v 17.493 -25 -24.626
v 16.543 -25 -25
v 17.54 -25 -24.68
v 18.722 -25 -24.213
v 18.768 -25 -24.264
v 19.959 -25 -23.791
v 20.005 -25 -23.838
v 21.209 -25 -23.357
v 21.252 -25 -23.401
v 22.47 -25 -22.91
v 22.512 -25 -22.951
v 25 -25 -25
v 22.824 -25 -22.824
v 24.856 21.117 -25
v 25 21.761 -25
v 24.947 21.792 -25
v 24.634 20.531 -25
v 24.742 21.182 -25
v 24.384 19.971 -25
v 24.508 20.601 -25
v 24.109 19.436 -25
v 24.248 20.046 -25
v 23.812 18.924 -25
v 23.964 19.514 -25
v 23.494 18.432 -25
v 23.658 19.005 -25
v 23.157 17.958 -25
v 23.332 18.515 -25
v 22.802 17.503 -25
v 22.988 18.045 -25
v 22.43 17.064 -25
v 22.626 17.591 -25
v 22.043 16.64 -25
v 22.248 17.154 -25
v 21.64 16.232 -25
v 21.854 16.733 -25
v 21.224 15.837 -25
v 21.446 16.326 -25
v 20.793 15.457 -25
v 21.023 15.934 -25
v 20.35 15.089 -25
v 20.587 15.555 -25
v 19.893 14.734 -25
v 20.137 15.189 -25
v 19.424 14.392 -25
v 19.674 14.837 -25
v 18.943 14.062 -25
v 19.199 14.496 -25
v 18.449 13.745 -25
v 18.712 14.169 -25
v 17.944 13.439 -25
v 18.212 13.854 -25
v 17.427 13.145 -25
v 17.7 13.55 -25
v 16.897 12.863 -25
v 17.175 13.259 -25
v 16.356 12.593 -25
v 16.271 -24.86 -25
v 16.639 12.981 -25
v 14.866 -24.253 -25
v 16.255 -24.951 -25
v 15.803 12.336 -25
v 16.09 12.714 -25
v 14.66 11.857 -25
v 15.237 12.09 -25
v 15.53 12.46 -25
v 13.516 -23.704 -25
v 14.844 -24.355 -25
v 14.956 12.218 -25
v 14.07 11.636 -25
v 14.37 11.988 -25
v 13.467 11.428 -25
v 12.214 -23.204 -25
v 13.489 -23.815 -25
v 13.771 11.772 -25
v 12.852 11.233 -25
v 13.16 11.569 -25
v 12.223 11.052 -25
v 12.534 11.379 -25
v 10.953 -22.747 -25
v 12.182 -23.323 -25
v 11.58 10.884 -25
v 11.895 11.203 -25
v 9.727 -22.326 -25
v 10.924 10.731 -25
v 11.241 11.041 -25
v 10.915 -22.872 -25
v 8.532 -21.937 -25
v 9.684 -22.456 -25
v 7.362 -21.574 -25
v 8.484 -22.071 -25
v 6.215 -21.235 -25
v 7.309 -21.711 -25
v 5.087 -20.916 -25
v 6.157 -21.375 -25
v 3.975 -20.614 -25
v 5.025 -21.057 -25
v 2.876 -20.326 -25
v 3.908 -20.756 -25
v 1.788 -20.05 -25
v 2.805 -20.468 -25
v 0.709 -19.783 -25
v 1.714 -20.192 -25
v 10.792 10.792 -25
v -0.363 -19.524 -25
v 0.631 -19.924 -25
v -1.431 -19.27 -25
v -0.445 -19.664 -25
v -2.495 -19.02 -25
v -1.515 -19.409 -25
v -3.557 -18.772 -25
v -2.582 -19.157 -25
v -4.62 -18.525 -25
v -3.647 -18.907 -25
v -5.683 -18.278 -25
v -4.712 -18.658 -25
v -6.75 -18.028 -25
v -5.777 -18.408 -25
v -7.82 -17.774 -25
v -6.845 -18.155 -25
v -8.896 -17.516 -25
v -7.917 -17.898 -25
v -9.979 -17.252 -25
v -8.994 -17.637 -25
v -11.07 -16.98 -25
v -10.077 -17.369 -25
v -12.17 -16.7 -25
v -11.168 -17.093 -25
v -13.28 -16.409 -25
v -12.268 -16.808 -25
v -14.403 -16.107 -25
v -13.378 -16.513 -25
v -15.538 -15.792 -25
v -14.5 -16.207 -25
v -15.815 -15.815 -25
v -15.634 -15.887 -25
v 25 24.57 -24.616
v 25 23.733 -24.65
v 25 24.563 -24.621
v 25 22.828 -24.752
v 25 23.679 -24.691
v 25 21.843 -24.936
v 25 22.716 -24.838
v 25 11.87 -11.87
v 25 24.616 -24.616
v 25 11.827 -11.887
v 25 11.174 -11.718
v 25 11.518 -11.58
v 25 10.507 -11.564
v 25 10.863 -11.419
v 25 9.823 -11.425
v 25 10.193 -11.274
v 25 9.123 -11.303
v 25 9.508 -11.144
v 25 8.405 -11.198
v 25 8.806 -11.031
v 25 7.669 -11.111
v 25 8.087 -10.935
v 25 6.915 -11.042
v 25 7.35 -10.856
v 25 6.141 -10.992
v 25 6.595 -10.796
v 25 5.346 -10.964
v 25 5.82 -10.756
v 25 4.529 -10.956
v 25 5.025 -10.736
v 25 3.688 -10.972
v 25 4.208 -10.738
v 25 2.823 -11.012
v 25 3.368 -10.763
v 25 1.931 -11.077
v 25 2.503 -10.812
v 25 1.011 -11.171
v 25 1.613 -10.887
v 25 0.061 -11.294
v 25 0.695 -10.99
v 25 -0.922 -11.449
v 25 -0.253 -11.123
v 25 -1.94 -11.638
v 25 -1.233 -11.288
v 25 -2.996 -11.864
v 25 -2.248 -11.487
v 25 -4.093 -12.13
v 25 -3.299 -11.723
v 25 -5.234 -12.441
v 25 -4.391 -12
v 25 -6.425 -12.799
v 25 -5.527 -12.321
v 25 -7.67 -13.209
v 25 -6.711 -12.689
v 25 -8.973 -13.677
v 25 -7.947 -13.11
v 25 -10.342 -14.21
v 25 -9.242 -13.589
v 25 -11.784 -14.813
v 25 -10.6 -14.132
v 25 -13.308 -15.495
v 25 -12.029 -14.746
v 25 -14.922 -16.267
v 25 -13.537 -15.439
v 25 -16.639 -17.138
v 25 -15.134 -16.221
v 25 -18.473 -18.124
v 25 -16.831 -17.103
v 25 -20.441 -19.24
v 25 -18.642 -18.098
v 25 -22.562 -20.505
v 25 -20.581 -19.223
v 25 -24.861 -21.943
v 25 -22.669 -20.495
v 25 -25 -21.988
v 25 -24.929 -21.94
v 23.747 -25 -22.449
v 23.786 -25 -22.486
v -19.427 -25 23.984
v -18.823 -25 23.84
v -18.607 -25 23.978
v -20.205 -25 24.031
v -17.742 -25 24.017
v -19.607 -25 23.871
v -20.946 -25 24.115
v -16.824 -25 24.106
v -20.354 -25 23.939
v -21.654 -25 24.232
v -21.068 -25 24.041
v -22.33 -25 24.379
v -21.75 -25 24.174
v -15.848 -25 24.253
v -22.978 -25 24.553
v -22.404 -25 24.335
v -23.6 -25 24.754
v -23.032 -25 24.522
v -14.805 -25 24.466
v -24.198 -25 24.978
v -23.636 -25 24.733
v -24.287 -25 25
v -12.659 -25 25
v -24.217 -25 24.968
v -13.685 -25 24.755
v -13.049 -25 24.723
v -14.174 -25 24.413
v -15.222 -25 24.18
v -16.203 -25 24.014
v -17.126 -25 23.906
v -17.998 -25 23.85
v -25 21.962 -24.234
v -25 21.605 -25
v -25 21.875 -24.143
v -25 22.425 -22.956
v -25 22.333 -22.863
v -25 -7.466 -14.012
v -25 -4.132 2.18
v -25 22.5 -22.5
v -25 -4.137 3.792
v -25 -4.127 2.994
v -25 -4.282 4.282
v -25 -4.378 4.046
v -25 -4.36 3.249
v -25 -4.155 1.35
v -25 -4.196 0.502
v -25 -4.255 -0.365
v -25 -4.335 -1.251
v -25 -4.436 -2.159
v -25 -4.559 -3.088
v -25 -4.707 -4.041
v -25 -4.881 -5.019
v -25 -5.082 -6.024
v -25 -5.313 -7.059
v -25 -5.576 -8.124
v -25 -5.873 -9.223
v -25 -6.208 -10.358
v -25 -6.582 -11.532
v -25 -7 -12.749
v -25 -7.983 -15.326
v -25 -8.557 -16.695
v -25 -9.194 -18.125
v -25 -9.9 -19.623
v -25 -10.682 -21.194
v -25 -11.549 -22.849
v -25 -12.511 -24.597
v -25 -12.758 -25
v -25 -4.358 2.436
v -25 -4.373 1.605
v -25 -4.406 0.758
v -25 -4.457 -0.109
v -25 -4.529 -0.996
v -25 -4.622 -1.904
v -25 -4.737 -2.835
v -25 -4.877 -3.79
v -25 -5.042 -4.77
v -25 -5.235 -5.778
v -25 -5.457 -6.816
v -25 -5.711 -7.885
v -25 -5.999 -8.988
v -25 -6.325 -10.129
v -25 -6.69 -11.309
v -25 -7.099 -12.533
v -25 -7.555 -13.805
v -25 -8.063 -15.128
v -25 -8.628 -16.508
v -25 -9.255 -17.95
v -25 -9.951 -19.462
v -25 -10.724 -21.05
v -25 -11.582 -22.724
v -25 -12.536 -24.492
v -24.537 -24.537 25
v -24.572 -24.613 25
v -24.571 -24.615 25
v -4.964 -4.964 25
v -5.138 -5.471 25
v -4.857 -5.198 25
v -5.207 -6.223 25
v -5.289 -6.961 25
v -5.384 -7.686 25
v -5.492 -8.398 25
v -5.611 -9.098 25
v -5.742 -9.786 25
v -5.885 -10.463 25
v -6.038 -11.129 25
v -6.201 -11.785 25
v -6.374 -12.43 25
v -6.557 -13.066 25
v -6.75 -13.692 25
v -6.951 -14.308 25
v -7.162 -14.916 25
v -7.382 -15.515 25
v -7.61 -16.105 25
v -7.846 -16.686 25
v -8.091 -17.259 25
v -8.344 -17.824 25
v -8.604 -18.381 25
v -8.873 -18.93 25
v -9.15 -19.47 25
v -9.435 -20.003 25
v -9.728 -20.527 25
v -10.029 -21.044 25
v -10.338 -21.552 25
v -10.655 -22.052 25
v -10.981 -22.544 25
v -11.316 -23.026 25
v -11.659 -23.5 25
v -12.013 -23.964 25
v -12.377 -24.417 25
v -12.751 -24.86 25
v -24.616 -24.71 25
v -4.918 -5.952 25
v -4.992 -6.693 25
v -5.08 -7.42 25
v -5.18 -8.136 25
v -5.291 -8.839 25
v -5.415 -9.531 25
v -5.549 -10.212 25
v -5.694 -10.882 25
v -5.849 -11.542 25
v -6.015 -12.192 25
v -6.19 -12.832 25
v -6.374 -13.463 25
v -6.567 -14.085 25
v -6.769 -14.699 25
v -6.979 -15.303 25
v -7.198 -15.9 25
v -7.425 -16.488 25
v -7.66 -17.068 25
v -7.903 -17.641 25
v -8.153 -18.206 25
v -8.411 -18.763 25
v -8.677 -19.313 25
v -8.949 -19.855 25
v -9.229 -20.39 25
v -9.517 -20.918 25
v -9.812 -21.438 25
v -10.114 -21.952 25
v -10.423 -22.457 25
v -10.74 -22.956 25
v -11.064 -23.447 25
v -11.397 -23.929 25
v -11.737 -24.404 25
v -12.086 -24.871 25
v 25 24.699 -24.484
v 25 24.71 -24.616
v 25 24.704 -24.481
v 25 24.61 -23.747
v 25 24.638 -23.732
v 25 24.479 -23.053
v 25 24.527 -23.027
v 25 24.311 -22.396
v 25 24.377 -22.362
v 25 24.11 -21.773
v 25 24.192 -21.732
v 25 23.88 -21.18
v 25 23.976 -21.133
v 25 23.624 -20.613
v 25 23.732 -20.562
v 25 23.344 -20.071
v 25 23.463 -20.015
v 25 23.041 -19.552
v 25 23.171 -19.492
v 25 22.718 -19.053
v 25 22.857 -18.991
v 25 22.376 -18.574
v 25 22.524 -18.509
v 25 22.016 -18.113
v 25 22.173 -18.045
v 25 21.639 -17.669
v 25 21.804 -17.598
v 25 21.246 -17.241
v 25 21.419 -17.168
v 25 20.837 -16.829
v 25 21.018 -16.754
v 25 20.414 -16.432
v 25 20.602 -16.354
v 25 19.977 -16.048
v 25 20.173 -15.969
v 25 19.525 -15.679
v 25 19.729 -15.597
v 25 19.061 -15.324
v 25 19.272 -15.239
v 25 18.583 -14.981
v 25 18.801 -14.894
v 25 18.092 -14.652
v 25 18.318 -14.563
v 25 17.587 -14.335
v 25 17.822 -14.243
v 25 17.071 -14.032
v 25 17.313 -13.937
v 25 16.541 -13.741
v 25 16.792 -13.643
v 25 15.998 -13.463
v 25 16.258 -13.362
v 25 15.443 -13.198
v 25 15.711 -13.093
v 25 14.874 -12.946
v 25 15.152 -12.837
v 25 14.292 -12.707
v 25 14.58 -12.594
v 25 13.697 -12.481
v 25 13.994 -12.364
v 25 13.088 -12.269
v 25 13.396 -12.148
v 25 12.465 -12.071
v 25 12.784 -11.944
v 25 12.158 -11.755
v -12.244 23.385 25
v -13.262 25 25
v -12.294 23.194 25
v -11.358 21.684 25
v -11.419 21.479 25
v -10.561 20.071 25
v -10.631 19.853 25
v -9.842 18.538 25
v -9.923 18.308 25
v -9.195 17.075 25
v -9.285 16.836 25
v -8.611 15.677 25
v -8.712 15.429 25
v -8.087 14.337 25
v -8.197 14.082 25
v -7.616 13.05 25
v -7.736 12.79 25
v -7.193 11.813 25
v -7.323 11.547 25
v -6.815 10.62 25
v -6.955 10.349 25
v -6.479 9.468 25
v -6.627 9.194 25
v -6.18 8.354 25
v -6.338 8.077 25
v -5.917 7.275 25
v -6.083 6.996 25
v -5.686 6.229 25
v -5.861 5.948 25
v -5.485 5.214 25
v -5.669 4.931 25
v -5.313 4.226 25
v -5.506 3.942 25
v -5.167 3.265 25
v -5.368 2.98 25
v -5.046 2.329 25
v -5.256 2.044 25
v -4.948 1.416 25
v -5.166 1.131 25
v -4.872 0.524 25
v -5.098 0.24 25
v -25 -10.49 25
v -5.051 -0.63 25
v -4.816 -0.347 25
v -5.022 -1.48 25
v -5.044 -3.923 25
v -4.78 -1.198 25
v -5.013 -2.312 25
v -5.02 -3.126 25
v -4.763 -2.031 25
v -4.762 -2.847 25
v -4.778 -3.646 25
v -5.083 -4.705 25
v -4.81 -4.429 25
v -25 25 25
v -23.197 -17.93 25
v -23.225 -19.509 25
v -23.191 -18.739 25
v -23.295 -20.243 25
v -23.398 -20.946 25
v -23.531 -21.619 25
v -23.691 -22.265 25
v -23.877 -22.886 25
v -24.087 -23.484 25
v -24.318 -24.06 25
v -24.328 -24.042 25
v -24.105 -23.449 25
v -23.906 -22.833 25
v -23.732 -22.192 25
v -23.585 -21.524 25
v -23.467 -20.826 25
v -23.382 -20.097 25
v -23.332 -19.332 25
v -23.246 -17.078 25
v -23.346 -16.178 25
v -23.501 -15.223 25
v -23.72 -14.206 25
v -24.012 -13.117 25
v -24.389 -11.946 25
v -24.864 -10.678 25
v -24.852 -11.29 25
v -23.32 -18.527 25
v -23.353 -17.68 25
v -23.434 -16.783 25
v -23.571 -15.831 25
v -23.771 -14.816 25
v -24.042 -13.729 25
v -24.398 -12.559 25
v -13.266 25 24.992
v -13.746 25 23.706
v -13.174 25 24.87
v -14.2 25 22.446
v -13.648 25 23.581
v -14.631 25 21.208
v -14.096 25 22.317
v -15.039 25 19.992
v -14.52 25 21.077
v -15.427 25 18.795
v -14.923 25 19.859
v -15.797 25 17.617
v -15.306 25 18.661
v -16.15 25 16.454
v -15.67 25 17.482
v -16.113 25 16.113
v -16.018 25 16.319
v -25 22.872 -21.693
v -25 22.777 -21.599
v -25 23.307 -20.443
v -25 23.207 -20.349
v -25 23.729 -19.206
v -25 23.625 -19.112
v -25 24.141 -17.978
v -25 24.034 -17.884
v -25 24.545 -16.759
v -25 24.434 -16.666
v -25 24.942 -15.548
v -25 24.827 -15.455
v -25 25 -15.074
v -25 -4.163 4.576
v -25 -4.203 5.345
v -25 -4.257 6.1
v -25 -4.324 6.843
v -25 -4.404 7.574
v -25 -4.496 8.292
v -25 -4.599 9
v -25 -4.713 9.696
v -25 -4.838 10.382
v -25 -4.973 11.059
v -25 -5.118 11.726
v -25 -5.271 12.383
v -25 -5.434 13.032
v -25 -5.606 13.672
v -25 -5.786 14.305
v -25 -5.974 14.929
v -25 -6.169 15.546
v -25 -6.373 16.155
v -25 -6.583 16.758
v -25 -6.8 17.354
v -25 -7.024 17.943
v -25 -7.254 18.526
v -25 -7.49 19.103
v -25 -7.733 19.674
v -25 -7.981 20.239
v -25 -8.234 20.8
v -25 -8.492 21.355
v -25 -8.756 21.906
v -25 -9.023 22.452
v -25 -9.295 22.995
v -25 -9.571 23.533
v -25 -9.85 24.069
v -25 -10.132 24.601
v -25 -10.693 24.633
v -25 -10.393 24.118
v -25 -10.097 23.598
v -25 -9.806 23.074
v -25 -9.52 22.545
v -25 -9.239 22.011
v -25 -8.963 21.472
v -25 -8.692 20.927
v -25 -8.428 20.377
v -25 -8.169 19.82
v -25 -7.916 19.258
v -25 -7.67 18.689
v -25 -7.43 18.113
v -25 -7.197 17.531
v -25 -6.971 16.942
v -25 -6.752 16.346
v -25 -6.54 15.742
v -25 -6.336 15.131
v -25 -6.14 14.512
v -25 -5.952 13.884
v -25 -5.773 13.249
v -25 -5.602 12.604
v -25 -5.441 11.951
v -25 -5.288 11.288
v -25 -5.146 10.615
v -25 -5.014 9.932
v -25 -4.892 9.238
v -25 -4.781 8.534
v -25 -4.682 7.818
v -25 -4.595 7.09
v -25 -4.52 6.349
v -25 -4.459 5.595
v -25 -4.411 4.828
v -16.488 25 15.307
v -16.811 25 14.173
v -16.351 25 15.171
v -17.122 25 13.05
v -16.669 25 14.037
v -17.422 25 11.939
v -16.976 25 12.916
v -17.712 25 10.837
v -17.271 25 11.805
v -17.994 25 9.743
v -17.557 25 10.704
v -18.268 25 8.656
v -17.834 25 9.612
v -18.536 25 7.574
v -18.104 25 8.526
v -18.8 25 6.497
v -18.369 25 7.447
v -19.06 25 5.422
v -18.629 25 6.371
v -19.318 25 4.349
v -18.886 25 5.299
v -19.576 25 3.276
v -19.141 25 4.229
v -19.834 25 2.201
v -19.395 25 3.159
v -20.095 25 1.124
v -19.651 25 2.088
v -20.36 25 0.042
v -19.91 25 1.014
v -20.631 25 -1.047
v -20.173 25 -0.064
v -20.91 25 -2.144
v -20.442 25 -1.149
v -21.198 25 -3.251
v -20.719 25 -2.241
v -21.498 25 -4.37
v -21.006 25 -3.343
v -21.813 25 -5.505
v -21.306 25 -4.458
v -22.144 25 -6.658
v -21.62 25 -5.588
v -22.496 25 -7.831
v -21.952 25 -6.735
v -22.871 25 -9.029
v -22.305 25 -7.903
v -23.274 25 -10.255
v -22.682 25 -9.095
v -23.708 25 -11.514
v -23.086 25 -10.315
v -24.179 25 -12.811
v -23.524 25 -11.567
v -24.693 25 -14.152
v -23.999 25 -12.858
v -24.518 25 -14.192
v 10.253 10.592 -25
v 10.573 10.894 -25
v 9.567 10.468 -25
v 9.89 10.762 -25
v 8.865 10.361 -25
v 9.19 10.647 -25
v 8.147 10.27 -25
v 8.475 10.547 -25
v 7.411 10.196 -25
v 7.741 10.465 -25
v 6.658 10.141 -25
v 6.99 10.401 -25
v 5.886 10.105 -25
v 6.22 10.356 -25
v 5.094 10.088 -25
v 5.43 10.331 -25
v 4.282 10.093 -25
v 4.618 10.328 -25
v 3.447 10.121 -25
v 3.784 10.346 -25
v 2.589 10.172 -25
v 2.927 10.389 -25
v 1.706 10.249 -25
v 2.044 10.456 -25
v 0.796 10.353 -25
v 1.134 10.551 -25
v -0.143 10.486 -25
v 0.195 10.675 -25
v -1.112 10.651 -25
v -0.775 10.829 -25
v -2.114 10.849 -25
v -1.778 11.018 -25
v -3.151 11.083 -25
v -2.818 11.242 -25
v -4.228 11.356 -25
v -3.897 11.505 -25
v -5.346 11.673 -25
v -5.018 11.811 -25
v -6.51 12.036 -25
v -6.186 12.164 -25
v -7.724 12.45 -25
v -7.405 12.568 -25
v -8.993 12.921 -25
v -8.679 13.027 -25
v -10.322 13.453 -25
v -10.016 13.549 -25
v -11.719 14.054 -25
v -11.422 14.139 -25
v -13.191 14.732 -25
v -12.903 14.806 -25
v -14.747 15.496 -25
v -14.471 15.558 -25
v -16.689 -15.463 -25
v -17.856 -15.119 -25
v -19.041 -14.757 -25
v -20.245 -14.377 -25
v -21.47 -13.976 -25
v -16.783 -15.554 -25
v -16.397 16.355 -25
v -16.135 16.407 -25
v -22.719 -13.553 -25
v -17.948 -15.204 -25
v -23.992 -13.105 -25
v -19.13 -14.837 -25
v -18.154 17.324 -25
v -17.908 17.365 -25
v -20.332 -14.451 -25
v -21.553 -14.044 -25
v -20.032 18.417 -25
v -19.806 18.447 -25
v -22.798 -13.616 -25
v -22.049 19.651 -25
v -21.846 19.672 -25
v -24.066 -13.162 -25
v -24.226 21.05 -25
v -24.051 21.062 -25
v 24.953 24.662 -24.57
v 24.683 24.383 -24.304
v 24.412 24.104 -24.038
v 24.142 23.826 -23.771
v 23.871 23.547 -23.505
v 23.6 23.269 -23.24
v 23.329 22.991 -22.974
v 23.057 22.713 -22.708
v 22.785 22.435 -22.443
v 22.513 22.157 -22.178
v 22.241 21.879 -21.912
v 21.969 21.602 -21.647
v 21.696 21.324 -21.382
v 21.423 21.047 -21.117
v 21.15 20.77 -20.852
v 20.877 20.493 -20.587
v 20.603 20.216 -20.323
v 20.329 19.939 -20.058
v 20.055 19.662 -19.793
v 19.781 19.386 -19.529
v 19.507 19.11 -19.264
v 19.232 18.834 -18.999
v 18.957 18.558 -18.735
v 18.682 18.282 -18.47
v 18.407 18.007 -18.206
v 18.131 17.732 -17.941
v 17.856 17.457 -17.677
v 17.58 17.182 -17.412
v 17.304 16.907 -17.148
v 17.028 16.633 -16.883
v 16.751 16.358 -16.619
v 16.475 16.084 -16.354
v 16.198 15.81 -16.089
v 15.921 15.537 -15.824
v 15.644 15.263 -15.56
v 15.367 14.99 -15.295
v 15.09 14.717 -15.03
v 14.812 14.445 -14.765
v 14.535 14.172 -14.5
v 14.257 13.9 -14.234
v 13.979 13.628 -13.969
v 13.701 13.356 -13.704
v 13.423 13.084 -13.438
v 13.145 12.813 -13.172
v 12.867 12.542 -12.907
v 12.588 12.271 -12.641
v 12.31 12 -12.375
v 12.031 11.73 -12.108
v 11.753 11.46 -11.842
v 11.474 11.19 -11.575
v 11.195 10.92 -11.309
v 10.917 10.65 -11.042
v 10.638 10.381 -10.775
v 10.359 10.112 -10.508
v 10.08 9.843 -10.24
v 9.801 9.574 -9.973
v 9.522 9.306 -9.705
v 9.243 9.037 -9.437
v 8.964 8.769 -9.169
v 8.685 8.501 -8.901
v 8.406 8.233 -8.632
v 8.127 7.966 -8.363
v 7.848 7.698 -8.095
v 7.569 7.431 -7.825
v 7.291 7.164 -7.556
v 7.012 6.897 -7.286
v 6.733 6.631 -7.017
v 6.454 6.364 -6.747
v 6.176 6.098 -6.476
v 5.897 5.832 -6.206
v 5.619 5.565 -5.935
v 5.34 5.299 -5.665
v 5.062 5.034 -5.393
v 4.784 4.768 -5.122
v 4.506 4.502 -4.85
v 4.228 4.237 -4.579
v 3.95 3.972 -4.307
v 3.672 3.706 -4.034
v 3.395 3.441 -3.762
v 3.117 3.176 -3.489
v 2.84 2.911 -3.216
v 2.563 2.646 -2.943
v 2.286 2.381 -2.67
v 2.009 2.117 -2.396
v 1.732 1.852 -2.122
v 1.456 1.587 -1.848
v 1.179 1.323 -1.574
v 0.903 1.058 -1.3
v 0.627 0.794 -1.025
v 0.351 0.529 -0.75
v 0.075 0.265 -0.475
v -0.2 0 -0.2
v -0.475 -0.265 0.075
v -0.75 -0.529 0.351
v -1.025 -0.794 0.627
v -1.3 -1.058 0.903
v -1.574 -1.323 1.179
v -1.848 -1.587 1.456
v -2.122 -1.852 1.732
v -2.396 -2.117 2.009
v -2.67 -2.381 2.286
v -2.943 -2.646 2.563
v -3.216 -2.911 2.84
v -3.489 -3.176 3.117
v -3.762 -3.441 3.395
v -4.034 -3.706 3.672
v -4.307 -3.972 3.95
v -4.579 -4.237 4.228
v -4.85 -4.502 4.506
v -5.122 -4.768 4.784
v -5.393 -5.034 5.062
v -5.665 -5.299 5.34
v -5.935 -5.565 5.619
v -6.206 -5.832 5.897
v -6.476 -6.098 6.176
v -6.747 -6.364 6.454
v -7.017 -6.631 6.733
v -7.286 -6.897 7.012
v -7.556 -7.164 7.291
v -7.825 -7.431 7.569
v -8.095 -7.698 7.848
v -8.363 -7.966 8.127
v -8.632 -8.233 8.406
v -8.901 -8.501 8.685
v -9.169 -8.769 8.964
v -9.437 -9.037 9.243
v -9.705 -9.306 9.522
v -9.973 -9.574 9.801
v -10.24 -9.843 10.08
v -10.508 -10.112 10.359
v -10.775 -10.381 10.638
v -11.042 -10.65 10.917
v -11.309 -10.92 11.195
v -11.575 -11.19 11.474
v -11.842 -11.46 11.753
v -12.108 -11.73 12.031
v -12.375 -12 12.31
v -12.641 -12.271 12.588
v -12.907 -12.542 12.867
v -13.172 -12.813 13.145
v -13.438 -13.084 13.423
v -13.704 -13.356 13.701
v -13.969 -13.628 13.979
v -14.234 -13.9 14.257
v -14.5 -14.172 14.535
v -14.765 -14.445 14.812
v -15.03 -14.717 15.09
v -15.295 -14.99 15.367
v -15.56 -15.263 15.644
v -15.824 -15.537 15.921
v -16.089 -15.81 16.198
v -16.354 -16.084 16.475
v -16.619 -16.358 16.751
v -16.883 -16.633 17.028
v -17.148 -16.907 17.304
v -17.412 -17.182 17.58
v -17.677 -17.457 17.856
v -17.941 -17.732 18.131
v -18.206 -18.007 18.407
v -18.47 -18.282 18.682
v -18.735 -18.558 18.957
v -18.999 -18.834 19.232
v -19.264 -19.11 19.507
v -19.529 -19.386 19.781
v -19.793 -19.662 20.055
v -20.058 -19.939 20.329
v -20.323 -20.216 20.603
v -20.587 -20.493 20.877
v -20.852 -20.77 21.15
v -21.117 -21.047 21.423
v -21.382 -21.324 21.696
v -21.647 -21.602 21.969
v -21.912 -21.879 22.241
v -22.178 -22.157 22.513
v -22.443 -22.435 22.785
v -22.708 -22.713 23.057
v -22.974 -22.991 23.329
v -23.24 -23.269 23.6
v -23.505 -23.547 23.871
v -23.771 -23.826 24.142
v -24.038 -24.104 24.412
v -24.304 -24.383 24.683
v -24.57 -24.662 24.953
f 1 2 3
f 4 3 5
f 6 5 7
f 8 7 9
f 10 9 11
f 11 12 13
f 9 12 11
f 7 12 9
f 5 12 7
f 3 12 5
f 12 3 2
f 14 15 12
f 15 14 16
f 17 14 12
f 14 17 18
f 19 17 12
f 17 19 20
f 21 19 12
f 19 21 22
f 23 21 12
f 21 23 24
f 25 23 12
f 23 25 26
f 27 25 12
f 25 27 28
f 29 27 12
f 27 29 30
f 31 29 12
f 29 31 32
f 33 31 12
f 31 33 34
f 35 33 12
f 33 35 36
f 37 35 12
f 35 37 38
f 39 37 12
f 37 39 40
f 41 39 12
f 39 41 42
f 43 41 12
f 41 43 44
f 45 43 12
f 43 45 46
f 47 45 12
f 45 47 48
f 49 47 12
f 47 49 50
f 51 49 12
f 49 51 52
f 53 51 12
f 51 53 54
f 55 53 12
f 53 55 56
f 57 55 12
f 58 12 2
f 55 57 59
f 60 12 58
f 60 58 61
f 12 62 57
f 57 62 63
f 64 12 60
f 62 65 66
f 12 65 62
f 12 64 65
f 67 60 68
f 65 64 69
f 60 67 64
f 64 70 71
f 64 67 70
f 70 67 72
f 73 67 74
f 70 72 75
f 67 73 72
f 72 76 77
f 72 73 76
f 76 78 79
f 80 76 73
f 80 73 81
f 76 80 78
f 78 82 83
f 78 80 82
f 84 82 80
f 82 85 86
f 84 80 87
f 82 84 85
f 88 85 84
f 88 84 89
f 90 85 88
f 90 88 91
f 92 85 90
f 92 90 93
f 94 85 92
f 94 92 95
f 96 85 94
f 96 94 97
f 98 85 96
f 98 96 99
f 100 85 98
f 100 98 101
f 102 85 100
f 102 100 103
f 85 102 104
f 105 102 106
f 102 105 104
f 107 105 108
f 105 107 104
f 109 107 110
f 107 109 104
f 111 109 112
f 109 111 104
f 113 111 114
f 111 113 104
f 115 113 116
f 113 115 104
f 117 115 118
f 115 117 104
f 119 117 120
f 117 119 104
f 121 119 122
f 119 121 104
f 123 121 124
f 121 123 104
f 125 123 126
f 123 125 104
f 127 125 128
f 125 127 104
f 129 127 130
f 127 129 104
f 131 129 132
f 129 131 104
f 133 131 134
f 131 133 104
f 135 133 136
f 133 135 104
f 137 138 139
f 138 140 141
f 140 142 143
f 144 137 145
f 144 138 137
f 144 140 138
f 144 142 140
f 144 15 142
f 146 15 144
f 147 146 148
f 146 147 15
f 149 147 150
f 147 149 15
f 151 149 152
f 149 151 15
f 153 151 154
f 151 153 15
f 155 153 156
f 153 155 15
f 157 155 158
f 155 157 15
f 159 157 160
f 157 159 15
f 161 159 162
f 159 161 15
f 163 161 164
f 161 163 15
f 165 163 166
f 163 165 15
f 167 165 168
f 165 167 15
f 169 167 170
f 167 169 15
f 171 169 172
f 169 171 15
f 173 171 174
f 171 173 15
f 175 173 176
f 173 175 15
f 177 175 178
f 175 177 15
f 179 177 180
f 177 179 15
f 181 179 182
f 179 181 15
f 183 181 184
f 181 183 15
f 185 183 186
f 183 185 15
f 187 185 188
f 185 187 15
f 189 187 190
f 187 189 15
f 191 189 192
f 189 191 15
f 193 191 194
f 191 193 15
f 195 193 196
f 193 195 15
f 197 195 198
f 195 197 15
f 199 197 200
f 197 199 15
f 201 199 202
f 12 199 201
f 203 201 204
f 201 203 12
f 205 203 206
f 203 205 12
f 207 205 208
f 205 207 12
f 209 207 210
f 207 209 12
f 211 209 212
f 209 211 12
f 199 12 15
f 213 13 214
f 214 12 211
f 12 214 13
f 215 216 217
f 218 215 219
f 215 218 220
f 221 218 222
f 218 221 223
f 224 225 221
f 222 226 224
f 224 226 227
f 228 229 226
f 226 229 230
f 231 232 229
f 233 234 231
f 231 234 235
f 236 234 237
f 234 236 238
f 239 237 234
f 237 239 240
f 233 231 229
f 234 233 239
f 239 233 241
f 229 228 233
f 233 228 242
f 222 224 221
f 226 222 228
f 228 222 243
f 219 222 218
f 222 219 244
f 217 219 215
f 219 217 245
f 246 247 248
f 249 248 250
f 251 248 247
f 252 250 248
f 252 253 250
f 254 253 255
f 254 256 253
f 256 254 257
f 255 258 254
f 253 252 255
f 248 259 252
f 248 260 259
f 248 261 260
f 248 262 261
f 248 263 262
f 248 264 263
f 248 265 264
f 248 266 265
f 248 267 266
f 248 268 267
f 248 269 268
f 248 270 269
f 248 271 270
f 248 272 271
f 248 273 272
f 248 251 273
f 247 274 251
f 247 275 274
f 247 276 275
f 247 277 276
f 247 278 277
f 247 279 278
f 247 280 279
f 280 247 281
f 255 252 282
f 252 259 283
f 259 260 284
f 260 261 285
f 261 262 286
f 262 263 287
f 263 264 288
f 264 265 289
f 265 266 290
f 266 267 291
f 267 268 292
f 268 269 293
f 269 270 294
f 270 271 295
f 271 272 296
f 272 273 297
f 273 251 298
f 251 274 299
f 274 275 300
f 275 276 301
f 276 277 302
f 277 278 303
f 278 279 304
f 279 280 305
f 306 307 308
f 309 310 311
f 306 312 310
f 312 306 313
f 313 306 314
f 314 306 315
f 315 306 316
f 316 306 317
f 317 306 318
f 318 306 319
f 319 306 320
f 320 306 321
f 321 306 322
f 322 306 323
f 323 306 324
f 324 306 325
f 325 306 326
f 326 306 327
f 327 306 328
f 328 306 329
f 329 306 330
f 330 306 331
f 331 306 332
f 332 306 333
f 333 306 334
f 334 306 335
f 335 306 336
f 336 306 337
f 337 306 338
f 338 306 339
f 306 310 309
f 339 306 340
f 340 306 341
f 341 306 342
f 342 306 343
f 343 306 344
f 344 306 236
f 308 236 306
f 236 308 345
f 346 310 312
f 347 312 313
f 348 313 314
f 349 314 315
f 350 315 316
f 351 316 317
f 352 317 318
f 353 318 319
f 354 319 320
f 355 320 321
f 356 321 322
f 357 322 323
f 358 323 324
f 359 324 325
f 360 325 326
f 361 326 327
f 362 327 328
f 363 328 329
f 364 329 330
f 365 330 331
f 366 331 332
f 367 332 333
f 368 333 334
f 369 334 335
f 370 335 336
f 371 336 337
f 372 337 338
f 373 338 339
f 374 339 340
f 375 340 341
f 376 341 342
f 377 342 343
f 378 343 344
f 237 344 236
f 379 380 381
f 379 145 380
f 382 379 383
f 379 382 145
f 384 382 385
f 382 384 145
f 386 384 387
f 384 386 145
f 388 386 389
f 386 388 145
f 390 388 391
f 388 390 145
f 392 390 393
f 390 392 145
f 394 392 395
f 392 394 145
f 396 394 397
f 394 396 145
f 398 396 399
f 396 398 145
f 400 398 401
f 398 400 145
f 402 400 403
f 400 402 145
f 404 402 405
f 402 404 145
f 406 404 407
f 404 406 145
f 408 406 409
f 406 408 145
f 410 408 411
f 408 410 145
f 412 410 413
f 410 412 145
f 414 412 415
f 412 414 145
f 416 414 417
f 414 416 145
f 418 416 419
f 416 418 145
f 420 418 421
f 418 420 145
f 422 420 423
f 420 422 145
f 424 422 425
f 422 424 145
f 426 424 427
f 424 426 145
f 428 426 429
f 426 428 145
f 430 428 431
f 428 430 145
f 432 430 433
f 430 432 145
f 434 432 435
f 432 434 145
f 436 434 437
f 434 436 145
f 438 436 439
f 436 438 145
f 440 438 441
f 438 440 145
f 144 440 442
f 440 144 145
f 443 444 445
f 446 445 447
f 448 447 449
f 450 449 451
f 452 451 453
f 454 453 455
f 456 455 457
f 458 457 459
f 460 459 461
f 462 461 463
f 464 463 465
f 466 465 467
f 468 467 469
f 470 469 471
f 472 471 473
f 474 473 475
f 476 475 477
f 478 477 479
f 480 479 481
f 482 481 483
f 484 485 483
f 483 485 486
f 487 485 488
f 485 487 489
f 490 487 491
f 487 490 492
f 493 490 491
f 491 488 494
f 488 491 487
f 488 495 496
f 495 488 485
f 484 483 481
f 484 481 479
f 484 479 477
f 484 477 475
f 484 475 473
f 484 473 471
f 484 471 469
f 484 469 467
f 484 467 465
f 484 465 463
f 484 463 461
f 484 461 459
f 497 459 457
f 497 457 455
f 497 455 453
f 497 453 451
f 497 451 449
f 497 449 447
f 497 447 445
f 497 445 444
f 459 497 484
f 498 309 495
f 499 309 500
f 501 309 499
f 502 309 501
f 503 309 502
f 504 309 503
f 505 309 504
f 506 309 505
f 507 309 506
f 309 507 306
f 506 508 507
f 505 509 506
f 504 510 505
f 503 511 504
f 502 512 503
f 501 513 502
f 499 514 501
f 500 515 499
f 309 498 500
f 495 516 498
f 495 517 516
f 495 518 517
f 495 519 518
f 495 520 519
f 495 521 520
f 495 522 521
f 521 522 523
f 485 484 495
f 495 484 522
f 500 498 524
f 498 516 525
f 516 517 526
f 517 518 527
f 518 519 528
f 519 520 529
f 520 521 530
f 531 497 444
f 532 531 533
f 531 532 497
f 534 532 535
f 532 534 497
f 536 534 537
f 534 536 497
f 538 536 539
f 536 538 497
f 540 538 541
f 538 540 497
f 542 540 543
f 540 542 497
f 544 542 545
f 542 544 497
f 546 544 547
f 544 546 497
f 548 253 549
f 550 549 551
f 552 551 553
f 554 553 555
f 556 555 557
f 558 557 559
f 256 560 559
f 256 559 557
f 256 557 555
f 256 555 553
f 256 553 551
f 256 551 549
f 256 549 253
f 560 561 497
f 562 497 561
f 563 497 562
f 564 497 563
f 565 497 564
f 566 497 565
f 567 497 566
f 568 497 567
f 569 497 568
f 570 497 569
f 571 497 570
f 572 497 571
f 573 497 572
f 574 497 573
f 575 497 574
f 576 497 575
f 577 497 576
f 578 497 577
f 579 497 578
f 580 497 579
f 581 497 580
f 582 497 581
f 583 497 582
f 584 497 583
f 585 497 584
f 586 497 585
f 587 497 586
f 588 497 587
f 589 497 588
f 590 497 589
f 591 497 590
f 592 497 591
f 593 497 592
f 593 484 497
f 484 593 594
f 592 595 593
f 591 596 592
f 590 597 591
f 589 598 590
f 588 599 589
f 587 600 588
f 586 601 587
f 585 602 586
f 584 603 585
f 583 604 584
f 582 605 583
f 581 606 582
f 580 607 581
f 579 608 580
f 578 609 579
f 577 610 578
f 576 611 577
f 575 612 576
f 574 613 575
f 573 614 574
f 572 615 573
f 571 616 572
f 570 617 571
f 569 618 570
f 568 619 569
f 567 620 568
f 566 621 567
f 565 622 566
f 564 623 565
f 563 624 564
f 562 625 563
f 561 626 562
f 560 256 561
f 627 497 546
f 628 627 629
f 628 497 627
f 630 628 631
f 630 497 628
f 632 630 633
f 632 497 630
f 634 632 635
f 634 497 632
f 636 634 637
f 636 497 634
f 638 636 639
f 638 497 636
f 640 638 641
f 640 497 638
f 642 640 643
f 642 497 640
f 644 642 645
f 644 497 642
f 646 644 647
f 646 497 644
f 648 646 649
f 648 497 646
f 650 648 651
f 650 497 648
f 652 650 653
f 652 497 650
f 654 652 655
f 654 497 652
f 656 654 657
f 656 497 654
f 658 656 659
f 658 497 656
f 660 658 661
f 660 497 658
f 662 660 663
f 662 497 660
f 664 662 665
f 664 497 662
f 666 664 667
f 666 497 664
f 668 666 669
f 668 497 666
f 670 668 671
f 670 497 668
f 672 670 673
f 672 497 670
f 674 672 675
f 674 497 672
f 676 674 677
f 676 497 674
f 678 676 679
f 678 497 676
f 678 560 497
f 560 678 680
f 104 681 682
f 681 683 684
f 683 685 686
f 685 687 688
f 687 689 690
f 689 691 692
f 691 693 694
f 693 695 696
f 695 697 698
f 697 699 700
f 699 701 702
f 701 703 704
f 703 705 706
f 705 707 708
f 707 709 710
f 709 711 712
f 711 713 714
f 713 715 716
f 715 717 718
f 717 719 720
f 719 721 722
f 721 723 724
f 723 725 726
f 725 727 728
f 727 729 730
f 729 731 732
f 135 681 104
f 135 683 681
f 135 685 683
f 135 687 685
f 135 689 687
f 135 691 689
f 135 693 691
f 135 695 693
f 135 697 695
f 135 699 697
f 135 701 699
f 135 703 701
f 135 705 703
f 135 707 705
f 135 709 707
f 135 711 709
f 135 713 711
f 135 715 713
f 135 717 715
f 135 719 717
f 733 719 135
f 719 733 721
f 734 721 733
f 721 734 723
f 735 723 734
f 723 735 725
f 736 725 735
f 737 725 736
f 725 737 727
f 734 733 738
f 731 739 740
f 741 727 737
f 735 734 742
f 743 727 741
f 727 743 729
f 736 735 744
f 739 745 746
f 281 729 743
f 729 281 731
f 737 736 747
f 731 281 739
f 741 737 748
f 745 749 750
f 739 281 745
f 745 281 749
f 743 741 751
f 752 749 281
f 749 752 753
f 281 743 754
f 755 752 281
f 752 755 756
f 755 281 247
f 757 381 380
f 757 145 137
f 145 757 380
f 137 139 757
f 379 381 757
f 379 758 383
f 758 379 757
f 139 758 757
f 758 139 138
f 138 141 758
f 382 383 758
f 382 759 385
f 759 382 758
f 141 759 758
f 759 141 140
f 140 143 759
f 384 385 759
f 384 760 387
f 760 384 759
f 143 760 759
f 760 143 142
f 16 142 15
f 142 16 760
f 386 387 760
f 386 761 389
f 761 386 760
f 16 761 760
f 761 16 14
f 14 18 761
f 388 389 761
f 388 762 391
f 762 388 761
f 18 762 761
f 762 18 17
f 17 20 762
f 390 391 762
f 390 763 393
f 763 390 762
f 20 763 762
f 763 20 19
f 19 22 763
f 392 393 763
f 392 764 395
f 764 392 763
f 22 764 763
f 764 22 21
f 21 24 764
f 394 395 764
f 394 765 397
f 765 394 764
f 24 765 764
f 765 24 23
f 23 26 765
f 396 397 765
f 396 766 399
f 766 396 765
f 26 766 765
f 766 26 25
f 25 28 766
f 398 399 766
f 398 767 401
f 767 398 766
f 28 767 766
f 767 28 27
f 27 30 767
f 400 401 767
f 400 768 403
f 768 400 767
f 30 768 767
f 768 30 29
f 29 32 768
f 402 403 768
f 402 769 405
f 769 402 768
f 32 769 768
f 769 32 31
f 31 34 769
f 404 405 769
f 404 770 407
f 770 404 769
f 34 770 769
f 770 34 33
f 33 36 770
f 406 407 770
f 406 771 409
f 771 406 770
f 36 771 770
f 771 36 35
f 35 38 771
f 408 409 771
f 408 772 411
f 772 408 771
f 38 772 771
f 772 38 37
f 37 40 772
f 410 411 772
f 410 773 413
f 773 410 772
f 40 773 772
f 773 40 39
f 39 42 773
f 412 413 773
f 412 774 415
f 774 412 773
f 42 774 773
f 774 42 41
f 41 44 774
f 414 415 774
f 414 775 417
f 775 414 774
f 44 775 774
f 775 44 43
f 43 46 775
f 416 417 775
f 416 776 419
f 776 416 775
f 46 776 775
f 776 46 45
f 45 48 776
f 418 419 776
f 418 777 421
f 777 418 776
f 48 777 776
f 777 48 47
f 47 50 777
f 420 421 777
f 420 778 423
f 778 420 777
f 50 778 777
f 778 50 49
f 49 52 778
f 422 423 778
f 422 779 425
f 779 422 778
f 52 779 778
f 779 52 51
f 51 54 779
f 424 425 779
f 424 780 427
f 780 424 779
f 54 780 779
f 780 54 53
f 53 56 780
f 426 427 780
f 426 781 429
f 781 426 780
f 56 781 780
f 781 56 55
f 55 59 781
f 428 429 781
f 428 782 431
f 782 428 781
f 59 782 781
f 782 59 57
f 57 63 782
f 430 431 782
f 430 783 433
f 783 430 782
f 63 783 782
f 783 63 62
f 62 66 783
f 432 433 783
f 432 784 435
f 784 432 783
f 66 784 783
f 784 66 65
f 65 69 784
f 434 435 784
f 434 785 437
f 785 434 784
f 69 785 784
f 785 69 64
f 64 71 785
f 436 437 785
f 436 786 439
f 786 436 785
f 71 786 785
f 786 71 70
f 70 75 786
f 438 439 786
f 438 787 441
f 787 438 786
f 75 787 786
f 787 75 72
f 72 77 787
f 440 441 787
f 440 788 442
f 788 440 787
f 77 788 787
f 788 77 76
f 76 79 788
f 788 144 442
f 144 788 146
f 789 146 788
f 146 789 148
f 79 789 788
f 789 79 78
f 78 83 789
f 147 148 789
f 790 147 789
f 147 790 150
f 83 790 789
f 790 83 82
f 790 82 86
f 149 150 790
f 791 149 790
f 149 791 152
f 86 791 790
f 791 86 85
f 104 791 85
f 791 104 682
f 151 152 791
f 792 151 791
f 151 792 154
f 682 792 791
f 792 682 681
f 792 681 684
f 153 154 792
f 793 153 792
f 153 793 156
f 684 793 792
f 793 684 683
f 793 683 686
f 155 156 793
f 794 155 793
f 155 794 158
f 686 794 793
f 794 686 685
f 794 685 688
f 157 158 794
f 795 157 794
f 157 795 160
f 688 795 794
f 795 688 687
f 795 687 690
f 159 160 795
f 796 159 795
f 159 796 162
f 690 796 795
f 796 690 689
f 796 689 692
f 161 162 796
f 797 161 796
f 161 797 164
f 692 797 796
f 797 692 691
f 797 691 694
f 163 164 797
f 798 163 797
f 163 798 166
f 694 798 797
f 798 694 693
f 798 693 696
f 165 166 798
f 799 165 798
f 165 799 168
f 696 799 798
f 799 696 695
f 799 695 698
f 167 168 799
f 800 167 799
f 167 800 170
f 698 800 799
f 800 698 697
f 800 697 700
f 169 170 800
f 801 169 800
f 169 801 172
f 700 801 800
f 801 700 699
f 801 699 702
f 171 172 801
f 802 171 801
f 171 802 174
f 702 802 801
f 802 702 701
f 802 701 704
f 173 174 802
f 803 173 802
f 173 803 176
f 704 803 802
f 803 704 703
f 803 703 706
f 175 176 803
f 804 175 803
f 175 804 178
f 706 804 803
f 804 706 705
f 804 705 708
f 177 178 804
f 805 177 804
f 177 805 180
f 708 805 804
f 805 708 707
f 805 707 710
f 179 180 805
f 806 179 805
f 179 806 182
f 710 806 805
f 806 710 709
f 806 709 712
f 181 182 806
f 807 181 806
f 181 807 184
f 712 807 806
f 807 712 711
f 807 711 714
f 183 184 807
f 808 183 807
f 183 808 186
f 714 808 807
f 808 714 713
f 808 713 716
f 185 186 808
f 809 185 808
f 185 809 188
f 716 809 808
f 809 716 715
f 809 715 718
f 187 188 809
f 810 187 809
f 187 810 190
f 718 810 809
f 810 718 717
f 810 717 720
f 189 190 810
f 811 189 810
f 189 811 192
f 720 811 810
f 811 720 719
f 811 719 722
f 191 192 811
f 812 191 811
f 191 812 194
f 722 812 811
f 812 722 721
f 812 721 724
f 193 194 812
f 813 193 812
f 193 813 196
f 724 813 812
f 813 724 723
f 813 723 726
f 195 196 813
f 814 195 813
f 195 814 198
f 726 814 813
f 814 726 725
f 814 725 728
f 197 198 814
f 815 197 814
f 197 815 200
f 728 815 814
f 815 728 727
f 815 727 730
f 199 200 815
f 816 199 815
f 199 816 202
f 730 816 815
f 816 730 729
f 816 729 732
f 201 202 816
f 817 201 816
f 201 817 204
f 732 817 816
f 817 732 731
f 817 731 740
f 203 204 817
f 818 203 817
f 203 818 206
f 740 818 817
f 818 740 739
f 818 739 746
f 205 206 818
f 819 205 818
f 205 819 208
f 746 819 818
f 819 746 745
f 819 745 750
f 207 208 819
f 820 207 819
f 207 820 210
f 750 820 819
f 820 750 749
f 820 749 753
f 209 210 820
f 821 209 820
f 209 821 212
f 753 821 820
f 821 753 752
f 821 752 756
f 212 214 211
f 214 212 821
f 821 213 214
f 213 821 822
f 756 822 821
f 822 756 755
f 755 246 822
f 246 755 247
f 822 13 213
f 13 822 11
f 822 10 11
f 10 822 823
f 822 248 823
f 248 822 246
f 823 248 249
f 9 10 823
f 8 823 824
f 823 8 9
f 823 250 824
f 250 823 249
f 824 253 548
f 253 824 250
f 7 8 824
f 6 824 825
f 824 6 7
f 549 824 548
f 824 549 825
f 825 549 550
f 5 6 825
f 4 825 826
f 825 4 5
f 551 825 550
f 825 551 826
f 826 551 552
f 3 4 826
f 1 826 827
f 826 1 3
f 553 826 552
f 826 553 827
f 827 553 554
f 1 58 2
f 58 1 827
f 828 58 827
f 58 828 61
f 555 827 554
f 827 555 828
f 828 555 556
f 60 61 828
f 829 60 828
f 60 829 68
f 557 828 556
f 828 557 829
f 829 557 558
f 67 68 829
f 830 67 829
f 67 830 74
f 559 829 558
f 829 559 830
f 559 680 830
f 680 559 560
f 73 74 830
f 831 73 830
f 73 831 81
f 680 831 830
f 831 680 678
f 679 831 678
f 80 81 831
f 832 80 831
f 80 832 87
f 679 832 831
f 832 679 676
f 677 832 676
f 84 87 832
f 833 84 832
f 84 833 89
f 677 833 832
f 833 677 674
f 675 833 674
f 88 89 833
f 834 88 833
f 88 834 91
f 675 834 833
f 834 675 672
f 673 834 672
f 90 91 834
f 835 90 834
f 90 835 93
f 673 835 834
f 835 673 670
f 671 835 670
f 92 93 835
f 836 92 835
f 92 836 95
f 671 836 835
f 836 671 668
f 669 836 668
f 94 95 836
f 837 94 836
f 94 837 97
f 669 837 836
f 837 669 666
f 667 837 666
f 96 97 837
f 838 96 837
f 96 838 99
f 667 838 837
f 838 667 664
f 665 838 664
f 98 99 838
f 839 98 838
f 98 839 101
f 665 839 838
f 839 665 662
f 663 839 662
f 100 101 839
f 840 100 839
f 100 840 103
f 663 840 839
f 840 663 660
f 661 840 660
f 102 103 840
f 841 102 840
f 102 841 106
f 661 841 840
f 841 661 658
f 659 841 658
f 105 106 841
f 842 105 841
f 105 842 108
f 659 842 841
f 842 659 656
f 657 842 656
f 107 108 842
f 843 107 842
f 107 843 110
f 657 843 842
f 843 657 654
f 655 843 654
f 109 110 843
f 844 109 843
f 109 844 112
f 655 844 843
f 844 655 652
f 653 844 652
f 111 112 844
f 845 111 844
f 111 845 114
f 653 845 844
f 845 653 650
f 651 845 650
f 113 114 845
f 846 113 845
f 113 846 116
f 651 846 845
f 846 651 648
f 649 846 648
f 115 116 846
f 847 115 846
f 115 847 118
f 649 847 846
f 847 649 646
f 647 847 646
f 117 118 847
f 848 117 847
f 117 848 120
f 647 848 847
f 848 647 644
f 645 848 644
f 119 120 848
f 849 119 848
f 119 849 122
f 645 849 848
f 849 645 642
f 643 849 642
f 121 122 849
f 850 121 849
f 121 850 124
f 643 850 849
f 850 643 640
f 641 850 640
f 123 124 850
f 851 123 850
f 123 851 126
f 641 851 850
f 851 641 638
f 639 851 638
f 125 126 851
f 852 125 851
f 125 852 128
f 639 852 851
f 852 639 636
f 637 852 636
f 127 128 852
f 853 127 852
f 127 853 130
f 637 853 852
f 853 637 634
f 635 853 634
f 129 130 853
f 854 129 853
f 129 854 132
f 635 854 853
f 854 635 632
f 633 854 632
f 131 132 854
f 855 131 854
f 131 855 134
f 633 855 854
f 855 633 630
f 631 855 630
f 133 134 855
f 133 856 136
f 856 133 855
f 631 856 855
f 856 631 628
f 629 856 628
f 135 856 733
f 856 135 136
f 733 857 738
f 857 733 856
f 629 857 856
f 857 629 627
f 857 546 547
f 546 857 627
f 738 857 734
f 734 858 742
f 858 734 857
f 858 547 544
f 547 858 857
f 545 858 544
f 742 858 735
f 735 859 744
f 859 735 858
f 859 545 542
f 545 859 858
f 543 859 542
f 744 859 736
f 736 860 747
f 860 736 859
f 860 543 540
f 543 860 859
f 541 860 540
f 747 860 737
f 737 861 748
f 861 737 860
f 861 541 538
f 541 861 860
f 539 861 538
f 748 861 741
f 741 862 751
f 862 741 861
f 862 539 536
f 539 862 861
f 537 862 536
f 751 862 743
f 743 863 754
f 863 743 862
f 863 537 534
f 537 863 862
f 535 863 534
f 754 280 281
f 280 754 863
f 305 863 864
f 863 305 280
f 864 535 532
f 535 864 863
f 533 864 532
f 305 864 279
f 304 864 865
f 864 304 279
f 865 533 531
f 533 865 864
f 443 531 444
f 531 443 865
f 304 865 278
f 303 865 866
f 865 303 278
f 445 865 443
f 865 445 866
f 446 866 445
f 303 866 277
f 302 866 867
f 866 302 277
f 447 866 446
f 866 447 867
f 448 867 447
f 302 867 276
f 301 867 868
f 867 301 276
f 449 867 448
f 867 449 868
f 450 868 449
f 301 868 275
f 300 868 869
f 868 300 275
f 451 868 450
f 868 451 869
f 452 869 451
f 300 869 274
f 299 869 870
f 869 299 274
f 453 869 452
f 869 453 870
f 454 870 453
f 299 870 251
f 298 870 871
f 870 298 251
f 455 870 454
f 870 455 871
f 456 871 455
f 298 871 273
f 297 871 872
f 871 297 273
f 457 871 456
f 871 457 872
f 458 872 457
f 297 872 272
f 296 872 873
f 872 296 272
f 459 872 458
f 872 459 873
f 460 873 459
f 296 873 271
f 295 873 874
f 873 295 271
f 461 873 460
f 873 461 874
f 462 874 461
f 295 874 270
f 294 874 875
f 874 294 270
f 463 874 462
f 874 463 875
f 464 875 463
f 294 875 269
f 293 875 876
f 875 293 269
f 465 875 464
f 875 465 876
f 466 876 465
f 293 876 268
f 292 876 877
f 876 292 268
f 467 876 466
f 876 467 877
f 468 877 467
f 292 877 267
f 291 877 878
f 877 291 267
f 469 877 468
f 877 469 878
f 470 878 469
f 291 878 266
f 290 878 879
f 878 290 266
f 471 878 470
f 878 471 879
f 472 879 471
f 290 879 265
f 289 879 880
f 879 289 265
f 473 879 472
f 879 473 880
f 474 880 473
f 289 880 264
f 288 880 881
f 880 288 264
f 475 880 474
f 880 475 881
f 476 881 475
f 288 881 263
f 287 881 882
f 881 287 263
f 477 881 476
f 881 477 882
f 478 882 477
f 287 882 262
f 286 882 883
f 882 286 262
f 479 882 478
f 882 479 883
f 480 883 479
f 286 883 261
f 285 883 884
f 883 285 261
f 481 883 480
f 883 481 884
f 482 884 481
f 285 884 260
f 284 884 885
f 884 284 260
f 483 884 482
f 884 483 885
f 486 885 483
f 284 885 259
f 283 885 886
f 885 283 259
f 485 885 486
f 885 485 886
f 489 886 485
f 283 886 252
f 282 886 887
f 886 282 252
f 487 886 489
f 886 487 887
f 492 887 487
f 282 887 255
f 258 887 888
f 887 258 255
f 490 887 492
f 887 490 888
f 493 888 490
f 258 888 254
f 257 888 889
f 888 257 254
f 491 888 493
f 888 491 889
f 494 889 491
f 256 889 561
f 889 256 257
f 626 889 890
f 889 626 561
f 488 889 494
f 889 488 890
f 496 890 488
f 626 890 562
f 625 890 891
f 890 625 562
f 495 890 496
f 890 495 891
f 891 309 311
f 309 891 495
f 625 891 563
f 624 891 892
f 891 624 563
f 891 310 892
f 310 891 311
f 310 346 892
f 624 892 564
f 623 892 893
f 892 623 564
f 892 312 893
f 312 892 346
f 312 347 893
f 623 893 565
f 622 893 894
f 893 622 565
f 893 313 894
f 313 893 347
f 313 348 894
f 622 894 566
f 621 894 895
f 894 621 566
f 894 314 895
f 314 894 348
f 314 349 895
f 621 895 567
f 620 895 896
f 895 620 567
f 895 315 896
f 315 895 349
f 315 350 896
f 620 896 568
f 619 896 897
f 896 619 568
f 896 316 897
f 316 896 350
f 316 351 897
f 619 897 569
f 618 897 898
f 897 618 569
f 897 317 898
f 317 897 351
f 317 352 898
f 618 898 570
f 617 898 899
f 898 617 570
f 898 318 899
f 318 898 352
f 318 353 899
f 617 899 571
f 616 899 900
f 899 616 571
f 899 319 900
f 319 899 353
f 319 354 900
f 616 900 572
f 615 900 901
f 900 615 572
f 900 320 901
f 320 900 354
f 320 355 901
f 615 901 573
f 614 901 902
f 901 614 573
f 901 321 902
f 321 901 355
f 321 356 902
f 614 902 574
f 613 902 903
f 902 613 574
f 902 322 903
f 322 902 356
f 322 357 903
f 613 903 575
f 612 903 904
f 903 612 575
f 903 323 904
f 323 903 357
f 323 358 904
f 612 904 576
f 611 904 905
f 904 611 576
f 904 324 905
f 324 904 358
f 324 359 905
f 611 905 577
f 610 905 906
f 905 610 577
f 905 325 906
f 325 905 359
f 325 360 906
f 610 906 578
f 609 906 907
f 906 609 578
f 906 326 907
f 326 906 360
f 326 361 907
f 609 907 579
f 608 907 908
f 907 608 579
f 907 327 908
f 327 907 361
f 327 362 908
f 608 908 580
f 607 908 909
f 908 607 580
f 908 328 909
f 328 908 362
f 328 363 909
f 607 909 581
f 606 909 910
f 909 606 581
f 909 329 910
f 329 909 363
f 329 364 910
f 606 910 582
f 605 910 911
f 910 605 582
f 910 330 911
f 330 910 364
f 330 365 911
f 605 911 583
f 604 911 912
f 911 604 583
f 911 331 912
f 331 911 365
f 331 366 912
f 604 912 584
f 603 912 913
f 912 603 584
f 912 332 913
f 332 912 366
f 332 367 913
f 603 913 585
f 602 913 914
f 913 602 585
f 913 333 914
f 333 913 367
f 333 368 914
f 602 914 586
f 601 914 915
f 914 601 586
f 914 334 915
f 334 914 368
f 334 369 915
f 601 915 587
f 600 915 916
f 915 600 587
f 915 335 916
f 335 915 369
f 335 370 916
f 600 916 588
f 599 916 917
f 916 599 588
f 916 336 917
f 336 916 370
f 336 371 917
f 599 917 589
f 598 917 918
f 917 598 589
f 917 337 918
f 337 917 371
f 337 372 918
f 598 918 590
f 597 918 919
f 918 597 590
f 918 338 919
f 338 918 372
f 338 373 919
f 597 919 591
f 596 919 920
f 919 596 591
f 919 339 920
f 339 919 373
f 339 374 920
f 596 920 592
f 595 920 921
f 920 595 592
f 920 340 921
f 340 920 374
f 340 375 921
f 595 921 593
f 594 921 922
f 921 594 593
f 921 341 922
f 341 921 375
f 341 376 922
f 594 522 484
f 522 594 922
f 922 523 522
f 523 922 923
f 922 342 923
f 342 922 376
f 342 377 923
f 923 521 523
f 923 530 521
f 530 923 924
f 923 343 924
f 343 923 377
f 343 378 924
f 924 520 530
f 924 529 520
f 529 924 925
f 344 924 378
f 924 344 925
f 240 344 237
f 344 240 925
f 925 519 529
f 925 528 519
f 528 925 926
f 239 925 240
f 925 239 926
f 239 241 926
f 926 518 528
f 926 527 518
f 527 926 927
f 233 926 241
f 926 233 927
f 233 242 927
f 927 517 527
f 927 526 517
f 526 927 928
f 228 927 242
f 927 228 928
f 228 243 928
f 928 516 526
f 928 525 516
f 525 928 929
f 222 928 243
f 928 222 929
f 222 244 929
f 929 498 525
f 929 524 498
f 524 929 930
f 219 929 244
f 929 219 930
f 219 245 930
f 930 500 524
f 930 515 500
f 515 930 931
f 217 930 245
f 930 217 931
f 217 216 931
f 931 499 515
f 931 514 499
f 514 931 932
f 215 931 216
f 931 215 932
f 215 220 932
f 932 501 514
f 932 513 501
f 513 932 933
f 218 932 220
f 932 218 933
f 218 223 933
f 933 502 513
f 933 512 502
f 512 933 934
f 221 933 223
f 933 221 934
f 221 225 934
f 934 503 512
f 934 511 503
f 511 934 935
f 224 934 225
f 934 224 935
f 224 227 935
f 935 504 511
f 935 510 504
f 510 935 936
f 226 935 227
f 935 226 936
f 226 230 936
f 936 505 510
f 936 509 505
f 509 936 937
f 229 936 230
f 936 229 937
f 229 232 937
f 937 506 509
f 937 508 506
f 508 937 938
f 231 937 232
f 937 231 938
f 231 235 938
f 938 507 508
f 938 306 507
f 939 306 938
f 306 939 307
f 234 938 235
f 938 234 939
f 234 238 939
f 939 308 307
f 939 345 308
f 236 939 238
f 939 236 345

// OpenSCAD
//size of the cube (mm)
edge = 50; //[10.0:100.0]

// angle in degrees you'll have to screw the pieces to assemble the cube
twist_angle = 330; //[300:720]

// size of the gap between pieces (mm)
epsilon = 0.4; //[0.0,0.05,0.1,0.15,0.2,0.3,0.4,0.5]


/* [Hidden] */
angle = atan(1/sqrt(2));
diag = edge*sqrt(3);
d = diag/2;

module piece(){
	  intersection(){
		 rotate ([45,angle,30])cube( [edge,edge,edge],center = true);
		translate([0, 0, -diag/2]) linear_extrude(height = diag, center = false, convexity = 10, twist = twist_angle, $fn = 200)
		polygon( points=[[0+epsilon/2,0+epsilon/2],[d+epsilon,-tan(30-epsilon)*d],[d,d],[0+epsilon/2,d]] );
	}
}



rotate ([45,0,-0]) rotate ([-0,-angle,-0]) rotate ([-0,-0,-30])color("blue")piece ();

// remove * to get the complete cube
*rotate ([45,0,-0]) rotate ([-0,-angle,-0]) rotate ([-0,-0,-30]) rotate([0,0,120,]) color("red")piece ("red");

*rotate ([45,0,-0]) rotate ([-0,-angle,-0]) rotate ([-0,-0,-30]) rotate([0,0,240,]) color("green")piece ();
